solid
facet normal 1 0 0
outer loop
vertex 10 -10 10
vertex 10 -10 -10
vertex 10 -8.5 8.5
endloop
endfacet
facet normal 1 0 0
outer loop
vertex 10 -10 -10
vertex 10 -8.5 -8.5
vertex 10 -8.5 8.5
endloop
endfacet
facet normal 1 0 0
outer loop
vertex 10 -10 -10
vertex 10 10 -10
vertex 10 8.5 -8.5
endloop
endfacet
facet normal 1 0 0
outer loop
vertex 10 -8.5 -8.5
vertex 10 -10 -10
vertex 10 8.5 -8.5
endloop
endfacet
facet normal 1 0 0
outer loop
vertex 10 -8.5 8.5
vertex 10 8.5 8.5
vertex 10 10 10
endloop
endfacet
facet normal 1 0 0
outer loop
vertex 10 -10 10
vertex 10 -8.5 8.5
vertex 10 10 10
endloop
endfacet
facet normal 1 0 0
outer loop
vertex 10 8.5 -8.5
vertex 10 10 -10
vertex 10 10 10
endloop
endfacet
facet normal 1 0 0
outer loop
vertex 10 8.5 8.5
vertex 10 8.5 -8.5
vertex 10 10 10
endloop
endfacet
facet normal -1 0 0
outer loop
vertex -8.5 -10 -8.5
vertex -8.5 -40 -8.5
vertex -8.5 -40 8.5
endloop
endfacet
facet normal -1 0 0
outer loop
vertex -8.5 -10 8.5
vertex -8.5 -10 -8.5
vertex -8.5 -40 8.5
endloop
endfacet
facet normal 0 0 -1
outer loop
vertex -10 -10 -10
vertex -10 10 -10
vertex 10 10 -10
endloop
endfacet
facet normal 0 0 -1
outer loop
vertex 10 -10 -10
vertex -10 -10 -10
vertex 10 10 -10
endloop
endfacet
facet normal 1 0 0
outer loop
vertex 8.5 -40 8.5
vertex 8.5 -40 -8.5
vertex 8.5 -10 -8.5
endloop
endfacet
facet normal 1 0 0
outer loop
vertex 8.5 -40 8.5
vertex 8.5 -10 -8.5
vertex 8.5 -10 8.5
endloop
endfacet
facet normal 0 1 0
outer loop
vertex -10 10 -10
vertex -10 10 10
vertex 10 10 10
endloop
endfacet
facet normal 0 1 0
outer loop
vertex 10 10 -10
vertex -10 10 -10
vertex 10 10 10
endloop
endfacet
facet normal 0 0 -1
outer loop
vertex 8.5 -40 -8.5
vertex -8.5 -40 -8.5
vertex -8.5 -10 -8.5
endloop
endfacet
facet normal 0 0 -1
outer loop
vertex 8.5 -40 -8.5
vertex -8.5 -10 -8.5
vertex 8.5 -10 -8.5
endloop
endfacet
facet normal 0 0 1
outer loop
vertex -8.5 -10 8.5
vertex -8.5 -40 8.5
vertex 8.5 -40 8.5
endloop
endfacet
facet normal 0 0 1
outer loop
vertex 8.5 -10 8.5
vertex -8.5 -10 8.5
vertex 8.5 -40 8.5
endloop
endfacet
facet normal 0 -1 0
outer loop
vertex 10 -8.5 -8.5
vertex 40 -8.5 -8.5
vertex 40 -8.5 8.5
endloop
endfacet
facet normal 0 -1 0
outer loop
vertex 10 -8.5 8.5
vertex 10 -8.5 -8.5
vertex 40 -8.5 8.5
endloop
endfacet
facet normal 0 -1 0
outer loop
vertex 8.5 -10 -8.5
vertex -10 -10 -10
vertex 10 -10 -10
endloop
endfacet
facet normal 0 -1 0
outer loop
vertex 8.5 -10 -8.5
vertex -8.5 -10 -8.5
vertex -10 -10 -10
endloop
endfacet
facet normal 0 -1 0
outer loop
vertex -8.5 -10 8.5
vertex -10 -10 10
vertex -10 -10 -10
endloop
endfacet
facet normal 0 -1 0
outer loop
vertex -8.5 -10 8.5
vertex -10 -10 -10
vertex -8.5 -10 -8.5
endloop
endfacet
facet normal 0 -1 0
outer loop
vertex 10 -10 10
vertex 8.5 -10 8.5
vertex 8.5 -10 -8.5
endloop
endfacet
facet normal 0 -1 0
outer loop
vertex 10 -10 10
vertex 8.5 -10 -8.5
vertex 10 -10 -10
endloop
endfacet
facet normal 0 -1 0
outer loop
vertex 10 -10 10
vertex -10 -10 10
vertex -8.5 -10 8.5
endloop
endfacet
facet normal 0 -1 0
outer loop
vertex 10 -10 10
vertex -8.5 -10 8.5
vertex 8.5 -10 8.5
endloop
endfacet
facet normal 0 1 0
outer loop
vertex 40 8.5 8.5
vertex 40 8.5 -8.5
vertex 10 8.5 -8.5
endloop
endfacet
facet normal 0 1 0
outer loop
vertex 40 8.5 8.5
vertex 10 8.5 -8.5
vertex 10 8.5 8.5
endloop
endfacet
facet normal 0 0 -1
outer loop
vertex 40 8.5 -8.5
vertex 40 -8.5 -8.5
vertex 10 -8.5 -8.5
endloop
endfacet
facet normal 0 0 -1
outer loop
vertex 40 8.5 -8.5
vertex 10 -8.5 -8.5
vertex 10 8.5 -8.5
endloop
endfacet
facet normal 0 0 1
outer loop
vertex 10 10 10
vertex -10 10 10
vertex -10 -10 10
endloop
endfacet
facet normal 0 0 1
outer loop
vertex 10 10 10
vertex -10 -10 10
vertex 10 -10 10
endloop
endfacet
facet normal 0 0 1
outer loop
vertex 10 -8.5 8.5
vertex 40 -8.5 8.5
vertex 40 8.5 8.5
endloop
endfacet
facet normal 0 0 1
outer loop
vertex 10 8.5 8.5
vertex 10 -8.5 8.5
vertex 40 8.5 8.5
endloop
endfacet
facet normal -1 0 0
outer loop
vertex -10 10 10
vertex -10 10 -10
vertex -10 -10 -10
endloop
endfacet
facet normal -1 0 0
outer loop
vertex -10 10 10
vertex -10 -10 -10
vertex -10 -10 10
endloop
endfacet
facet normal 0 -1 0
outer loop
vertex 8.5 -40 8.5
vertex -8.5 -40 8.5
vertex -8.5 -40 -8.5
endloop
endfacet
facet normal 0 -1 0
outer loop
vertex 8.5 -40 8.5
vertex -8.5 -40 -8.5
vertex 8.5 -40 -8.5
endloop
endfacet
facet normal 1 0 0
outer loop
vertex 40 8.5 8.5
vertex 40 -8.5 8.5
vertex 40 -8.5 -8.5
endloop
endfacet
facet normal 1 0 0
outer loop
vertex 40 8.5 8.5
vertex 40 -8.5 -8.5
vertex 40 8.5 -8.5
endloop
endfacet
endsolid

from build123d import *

# Parameters (mm, degrees)
F0_W     = 20
F0_H     = 20
F1_DEPTH = 20
F3_W     = 17
F3_H     = 17
F4_DEPTH = 30
F5_W     = 17
F5_H     = 17
F6_DEPTH = 30


with BuildPart() as f1:
    # F0 (on Front) → F1 (new body)
    with BuildSketch(Plane.XZ):
        Rectangle(F0_W, F0_H)
    extrude(amount=F1_DEPTH)


with BuildPart() as f1_1:
    # F2: moved
    add(f1.part.moved(Location((0, 10, 0))))

    # F3 (on face) → F4 (join)
    with BuildSketch(Plane.XZ.offset(10)):
        Rectangle(F3_W, F3_H)
    extrude(amount=F4_DEPTH)

    # F5 (on face) → F6 (join)
    with BuildSketch(Plane.YZ.offset(10)):
        Rectangle(F5_W, F5_H)
    extrude(amount=F6_DEPTH)


solid = f1_1.part
